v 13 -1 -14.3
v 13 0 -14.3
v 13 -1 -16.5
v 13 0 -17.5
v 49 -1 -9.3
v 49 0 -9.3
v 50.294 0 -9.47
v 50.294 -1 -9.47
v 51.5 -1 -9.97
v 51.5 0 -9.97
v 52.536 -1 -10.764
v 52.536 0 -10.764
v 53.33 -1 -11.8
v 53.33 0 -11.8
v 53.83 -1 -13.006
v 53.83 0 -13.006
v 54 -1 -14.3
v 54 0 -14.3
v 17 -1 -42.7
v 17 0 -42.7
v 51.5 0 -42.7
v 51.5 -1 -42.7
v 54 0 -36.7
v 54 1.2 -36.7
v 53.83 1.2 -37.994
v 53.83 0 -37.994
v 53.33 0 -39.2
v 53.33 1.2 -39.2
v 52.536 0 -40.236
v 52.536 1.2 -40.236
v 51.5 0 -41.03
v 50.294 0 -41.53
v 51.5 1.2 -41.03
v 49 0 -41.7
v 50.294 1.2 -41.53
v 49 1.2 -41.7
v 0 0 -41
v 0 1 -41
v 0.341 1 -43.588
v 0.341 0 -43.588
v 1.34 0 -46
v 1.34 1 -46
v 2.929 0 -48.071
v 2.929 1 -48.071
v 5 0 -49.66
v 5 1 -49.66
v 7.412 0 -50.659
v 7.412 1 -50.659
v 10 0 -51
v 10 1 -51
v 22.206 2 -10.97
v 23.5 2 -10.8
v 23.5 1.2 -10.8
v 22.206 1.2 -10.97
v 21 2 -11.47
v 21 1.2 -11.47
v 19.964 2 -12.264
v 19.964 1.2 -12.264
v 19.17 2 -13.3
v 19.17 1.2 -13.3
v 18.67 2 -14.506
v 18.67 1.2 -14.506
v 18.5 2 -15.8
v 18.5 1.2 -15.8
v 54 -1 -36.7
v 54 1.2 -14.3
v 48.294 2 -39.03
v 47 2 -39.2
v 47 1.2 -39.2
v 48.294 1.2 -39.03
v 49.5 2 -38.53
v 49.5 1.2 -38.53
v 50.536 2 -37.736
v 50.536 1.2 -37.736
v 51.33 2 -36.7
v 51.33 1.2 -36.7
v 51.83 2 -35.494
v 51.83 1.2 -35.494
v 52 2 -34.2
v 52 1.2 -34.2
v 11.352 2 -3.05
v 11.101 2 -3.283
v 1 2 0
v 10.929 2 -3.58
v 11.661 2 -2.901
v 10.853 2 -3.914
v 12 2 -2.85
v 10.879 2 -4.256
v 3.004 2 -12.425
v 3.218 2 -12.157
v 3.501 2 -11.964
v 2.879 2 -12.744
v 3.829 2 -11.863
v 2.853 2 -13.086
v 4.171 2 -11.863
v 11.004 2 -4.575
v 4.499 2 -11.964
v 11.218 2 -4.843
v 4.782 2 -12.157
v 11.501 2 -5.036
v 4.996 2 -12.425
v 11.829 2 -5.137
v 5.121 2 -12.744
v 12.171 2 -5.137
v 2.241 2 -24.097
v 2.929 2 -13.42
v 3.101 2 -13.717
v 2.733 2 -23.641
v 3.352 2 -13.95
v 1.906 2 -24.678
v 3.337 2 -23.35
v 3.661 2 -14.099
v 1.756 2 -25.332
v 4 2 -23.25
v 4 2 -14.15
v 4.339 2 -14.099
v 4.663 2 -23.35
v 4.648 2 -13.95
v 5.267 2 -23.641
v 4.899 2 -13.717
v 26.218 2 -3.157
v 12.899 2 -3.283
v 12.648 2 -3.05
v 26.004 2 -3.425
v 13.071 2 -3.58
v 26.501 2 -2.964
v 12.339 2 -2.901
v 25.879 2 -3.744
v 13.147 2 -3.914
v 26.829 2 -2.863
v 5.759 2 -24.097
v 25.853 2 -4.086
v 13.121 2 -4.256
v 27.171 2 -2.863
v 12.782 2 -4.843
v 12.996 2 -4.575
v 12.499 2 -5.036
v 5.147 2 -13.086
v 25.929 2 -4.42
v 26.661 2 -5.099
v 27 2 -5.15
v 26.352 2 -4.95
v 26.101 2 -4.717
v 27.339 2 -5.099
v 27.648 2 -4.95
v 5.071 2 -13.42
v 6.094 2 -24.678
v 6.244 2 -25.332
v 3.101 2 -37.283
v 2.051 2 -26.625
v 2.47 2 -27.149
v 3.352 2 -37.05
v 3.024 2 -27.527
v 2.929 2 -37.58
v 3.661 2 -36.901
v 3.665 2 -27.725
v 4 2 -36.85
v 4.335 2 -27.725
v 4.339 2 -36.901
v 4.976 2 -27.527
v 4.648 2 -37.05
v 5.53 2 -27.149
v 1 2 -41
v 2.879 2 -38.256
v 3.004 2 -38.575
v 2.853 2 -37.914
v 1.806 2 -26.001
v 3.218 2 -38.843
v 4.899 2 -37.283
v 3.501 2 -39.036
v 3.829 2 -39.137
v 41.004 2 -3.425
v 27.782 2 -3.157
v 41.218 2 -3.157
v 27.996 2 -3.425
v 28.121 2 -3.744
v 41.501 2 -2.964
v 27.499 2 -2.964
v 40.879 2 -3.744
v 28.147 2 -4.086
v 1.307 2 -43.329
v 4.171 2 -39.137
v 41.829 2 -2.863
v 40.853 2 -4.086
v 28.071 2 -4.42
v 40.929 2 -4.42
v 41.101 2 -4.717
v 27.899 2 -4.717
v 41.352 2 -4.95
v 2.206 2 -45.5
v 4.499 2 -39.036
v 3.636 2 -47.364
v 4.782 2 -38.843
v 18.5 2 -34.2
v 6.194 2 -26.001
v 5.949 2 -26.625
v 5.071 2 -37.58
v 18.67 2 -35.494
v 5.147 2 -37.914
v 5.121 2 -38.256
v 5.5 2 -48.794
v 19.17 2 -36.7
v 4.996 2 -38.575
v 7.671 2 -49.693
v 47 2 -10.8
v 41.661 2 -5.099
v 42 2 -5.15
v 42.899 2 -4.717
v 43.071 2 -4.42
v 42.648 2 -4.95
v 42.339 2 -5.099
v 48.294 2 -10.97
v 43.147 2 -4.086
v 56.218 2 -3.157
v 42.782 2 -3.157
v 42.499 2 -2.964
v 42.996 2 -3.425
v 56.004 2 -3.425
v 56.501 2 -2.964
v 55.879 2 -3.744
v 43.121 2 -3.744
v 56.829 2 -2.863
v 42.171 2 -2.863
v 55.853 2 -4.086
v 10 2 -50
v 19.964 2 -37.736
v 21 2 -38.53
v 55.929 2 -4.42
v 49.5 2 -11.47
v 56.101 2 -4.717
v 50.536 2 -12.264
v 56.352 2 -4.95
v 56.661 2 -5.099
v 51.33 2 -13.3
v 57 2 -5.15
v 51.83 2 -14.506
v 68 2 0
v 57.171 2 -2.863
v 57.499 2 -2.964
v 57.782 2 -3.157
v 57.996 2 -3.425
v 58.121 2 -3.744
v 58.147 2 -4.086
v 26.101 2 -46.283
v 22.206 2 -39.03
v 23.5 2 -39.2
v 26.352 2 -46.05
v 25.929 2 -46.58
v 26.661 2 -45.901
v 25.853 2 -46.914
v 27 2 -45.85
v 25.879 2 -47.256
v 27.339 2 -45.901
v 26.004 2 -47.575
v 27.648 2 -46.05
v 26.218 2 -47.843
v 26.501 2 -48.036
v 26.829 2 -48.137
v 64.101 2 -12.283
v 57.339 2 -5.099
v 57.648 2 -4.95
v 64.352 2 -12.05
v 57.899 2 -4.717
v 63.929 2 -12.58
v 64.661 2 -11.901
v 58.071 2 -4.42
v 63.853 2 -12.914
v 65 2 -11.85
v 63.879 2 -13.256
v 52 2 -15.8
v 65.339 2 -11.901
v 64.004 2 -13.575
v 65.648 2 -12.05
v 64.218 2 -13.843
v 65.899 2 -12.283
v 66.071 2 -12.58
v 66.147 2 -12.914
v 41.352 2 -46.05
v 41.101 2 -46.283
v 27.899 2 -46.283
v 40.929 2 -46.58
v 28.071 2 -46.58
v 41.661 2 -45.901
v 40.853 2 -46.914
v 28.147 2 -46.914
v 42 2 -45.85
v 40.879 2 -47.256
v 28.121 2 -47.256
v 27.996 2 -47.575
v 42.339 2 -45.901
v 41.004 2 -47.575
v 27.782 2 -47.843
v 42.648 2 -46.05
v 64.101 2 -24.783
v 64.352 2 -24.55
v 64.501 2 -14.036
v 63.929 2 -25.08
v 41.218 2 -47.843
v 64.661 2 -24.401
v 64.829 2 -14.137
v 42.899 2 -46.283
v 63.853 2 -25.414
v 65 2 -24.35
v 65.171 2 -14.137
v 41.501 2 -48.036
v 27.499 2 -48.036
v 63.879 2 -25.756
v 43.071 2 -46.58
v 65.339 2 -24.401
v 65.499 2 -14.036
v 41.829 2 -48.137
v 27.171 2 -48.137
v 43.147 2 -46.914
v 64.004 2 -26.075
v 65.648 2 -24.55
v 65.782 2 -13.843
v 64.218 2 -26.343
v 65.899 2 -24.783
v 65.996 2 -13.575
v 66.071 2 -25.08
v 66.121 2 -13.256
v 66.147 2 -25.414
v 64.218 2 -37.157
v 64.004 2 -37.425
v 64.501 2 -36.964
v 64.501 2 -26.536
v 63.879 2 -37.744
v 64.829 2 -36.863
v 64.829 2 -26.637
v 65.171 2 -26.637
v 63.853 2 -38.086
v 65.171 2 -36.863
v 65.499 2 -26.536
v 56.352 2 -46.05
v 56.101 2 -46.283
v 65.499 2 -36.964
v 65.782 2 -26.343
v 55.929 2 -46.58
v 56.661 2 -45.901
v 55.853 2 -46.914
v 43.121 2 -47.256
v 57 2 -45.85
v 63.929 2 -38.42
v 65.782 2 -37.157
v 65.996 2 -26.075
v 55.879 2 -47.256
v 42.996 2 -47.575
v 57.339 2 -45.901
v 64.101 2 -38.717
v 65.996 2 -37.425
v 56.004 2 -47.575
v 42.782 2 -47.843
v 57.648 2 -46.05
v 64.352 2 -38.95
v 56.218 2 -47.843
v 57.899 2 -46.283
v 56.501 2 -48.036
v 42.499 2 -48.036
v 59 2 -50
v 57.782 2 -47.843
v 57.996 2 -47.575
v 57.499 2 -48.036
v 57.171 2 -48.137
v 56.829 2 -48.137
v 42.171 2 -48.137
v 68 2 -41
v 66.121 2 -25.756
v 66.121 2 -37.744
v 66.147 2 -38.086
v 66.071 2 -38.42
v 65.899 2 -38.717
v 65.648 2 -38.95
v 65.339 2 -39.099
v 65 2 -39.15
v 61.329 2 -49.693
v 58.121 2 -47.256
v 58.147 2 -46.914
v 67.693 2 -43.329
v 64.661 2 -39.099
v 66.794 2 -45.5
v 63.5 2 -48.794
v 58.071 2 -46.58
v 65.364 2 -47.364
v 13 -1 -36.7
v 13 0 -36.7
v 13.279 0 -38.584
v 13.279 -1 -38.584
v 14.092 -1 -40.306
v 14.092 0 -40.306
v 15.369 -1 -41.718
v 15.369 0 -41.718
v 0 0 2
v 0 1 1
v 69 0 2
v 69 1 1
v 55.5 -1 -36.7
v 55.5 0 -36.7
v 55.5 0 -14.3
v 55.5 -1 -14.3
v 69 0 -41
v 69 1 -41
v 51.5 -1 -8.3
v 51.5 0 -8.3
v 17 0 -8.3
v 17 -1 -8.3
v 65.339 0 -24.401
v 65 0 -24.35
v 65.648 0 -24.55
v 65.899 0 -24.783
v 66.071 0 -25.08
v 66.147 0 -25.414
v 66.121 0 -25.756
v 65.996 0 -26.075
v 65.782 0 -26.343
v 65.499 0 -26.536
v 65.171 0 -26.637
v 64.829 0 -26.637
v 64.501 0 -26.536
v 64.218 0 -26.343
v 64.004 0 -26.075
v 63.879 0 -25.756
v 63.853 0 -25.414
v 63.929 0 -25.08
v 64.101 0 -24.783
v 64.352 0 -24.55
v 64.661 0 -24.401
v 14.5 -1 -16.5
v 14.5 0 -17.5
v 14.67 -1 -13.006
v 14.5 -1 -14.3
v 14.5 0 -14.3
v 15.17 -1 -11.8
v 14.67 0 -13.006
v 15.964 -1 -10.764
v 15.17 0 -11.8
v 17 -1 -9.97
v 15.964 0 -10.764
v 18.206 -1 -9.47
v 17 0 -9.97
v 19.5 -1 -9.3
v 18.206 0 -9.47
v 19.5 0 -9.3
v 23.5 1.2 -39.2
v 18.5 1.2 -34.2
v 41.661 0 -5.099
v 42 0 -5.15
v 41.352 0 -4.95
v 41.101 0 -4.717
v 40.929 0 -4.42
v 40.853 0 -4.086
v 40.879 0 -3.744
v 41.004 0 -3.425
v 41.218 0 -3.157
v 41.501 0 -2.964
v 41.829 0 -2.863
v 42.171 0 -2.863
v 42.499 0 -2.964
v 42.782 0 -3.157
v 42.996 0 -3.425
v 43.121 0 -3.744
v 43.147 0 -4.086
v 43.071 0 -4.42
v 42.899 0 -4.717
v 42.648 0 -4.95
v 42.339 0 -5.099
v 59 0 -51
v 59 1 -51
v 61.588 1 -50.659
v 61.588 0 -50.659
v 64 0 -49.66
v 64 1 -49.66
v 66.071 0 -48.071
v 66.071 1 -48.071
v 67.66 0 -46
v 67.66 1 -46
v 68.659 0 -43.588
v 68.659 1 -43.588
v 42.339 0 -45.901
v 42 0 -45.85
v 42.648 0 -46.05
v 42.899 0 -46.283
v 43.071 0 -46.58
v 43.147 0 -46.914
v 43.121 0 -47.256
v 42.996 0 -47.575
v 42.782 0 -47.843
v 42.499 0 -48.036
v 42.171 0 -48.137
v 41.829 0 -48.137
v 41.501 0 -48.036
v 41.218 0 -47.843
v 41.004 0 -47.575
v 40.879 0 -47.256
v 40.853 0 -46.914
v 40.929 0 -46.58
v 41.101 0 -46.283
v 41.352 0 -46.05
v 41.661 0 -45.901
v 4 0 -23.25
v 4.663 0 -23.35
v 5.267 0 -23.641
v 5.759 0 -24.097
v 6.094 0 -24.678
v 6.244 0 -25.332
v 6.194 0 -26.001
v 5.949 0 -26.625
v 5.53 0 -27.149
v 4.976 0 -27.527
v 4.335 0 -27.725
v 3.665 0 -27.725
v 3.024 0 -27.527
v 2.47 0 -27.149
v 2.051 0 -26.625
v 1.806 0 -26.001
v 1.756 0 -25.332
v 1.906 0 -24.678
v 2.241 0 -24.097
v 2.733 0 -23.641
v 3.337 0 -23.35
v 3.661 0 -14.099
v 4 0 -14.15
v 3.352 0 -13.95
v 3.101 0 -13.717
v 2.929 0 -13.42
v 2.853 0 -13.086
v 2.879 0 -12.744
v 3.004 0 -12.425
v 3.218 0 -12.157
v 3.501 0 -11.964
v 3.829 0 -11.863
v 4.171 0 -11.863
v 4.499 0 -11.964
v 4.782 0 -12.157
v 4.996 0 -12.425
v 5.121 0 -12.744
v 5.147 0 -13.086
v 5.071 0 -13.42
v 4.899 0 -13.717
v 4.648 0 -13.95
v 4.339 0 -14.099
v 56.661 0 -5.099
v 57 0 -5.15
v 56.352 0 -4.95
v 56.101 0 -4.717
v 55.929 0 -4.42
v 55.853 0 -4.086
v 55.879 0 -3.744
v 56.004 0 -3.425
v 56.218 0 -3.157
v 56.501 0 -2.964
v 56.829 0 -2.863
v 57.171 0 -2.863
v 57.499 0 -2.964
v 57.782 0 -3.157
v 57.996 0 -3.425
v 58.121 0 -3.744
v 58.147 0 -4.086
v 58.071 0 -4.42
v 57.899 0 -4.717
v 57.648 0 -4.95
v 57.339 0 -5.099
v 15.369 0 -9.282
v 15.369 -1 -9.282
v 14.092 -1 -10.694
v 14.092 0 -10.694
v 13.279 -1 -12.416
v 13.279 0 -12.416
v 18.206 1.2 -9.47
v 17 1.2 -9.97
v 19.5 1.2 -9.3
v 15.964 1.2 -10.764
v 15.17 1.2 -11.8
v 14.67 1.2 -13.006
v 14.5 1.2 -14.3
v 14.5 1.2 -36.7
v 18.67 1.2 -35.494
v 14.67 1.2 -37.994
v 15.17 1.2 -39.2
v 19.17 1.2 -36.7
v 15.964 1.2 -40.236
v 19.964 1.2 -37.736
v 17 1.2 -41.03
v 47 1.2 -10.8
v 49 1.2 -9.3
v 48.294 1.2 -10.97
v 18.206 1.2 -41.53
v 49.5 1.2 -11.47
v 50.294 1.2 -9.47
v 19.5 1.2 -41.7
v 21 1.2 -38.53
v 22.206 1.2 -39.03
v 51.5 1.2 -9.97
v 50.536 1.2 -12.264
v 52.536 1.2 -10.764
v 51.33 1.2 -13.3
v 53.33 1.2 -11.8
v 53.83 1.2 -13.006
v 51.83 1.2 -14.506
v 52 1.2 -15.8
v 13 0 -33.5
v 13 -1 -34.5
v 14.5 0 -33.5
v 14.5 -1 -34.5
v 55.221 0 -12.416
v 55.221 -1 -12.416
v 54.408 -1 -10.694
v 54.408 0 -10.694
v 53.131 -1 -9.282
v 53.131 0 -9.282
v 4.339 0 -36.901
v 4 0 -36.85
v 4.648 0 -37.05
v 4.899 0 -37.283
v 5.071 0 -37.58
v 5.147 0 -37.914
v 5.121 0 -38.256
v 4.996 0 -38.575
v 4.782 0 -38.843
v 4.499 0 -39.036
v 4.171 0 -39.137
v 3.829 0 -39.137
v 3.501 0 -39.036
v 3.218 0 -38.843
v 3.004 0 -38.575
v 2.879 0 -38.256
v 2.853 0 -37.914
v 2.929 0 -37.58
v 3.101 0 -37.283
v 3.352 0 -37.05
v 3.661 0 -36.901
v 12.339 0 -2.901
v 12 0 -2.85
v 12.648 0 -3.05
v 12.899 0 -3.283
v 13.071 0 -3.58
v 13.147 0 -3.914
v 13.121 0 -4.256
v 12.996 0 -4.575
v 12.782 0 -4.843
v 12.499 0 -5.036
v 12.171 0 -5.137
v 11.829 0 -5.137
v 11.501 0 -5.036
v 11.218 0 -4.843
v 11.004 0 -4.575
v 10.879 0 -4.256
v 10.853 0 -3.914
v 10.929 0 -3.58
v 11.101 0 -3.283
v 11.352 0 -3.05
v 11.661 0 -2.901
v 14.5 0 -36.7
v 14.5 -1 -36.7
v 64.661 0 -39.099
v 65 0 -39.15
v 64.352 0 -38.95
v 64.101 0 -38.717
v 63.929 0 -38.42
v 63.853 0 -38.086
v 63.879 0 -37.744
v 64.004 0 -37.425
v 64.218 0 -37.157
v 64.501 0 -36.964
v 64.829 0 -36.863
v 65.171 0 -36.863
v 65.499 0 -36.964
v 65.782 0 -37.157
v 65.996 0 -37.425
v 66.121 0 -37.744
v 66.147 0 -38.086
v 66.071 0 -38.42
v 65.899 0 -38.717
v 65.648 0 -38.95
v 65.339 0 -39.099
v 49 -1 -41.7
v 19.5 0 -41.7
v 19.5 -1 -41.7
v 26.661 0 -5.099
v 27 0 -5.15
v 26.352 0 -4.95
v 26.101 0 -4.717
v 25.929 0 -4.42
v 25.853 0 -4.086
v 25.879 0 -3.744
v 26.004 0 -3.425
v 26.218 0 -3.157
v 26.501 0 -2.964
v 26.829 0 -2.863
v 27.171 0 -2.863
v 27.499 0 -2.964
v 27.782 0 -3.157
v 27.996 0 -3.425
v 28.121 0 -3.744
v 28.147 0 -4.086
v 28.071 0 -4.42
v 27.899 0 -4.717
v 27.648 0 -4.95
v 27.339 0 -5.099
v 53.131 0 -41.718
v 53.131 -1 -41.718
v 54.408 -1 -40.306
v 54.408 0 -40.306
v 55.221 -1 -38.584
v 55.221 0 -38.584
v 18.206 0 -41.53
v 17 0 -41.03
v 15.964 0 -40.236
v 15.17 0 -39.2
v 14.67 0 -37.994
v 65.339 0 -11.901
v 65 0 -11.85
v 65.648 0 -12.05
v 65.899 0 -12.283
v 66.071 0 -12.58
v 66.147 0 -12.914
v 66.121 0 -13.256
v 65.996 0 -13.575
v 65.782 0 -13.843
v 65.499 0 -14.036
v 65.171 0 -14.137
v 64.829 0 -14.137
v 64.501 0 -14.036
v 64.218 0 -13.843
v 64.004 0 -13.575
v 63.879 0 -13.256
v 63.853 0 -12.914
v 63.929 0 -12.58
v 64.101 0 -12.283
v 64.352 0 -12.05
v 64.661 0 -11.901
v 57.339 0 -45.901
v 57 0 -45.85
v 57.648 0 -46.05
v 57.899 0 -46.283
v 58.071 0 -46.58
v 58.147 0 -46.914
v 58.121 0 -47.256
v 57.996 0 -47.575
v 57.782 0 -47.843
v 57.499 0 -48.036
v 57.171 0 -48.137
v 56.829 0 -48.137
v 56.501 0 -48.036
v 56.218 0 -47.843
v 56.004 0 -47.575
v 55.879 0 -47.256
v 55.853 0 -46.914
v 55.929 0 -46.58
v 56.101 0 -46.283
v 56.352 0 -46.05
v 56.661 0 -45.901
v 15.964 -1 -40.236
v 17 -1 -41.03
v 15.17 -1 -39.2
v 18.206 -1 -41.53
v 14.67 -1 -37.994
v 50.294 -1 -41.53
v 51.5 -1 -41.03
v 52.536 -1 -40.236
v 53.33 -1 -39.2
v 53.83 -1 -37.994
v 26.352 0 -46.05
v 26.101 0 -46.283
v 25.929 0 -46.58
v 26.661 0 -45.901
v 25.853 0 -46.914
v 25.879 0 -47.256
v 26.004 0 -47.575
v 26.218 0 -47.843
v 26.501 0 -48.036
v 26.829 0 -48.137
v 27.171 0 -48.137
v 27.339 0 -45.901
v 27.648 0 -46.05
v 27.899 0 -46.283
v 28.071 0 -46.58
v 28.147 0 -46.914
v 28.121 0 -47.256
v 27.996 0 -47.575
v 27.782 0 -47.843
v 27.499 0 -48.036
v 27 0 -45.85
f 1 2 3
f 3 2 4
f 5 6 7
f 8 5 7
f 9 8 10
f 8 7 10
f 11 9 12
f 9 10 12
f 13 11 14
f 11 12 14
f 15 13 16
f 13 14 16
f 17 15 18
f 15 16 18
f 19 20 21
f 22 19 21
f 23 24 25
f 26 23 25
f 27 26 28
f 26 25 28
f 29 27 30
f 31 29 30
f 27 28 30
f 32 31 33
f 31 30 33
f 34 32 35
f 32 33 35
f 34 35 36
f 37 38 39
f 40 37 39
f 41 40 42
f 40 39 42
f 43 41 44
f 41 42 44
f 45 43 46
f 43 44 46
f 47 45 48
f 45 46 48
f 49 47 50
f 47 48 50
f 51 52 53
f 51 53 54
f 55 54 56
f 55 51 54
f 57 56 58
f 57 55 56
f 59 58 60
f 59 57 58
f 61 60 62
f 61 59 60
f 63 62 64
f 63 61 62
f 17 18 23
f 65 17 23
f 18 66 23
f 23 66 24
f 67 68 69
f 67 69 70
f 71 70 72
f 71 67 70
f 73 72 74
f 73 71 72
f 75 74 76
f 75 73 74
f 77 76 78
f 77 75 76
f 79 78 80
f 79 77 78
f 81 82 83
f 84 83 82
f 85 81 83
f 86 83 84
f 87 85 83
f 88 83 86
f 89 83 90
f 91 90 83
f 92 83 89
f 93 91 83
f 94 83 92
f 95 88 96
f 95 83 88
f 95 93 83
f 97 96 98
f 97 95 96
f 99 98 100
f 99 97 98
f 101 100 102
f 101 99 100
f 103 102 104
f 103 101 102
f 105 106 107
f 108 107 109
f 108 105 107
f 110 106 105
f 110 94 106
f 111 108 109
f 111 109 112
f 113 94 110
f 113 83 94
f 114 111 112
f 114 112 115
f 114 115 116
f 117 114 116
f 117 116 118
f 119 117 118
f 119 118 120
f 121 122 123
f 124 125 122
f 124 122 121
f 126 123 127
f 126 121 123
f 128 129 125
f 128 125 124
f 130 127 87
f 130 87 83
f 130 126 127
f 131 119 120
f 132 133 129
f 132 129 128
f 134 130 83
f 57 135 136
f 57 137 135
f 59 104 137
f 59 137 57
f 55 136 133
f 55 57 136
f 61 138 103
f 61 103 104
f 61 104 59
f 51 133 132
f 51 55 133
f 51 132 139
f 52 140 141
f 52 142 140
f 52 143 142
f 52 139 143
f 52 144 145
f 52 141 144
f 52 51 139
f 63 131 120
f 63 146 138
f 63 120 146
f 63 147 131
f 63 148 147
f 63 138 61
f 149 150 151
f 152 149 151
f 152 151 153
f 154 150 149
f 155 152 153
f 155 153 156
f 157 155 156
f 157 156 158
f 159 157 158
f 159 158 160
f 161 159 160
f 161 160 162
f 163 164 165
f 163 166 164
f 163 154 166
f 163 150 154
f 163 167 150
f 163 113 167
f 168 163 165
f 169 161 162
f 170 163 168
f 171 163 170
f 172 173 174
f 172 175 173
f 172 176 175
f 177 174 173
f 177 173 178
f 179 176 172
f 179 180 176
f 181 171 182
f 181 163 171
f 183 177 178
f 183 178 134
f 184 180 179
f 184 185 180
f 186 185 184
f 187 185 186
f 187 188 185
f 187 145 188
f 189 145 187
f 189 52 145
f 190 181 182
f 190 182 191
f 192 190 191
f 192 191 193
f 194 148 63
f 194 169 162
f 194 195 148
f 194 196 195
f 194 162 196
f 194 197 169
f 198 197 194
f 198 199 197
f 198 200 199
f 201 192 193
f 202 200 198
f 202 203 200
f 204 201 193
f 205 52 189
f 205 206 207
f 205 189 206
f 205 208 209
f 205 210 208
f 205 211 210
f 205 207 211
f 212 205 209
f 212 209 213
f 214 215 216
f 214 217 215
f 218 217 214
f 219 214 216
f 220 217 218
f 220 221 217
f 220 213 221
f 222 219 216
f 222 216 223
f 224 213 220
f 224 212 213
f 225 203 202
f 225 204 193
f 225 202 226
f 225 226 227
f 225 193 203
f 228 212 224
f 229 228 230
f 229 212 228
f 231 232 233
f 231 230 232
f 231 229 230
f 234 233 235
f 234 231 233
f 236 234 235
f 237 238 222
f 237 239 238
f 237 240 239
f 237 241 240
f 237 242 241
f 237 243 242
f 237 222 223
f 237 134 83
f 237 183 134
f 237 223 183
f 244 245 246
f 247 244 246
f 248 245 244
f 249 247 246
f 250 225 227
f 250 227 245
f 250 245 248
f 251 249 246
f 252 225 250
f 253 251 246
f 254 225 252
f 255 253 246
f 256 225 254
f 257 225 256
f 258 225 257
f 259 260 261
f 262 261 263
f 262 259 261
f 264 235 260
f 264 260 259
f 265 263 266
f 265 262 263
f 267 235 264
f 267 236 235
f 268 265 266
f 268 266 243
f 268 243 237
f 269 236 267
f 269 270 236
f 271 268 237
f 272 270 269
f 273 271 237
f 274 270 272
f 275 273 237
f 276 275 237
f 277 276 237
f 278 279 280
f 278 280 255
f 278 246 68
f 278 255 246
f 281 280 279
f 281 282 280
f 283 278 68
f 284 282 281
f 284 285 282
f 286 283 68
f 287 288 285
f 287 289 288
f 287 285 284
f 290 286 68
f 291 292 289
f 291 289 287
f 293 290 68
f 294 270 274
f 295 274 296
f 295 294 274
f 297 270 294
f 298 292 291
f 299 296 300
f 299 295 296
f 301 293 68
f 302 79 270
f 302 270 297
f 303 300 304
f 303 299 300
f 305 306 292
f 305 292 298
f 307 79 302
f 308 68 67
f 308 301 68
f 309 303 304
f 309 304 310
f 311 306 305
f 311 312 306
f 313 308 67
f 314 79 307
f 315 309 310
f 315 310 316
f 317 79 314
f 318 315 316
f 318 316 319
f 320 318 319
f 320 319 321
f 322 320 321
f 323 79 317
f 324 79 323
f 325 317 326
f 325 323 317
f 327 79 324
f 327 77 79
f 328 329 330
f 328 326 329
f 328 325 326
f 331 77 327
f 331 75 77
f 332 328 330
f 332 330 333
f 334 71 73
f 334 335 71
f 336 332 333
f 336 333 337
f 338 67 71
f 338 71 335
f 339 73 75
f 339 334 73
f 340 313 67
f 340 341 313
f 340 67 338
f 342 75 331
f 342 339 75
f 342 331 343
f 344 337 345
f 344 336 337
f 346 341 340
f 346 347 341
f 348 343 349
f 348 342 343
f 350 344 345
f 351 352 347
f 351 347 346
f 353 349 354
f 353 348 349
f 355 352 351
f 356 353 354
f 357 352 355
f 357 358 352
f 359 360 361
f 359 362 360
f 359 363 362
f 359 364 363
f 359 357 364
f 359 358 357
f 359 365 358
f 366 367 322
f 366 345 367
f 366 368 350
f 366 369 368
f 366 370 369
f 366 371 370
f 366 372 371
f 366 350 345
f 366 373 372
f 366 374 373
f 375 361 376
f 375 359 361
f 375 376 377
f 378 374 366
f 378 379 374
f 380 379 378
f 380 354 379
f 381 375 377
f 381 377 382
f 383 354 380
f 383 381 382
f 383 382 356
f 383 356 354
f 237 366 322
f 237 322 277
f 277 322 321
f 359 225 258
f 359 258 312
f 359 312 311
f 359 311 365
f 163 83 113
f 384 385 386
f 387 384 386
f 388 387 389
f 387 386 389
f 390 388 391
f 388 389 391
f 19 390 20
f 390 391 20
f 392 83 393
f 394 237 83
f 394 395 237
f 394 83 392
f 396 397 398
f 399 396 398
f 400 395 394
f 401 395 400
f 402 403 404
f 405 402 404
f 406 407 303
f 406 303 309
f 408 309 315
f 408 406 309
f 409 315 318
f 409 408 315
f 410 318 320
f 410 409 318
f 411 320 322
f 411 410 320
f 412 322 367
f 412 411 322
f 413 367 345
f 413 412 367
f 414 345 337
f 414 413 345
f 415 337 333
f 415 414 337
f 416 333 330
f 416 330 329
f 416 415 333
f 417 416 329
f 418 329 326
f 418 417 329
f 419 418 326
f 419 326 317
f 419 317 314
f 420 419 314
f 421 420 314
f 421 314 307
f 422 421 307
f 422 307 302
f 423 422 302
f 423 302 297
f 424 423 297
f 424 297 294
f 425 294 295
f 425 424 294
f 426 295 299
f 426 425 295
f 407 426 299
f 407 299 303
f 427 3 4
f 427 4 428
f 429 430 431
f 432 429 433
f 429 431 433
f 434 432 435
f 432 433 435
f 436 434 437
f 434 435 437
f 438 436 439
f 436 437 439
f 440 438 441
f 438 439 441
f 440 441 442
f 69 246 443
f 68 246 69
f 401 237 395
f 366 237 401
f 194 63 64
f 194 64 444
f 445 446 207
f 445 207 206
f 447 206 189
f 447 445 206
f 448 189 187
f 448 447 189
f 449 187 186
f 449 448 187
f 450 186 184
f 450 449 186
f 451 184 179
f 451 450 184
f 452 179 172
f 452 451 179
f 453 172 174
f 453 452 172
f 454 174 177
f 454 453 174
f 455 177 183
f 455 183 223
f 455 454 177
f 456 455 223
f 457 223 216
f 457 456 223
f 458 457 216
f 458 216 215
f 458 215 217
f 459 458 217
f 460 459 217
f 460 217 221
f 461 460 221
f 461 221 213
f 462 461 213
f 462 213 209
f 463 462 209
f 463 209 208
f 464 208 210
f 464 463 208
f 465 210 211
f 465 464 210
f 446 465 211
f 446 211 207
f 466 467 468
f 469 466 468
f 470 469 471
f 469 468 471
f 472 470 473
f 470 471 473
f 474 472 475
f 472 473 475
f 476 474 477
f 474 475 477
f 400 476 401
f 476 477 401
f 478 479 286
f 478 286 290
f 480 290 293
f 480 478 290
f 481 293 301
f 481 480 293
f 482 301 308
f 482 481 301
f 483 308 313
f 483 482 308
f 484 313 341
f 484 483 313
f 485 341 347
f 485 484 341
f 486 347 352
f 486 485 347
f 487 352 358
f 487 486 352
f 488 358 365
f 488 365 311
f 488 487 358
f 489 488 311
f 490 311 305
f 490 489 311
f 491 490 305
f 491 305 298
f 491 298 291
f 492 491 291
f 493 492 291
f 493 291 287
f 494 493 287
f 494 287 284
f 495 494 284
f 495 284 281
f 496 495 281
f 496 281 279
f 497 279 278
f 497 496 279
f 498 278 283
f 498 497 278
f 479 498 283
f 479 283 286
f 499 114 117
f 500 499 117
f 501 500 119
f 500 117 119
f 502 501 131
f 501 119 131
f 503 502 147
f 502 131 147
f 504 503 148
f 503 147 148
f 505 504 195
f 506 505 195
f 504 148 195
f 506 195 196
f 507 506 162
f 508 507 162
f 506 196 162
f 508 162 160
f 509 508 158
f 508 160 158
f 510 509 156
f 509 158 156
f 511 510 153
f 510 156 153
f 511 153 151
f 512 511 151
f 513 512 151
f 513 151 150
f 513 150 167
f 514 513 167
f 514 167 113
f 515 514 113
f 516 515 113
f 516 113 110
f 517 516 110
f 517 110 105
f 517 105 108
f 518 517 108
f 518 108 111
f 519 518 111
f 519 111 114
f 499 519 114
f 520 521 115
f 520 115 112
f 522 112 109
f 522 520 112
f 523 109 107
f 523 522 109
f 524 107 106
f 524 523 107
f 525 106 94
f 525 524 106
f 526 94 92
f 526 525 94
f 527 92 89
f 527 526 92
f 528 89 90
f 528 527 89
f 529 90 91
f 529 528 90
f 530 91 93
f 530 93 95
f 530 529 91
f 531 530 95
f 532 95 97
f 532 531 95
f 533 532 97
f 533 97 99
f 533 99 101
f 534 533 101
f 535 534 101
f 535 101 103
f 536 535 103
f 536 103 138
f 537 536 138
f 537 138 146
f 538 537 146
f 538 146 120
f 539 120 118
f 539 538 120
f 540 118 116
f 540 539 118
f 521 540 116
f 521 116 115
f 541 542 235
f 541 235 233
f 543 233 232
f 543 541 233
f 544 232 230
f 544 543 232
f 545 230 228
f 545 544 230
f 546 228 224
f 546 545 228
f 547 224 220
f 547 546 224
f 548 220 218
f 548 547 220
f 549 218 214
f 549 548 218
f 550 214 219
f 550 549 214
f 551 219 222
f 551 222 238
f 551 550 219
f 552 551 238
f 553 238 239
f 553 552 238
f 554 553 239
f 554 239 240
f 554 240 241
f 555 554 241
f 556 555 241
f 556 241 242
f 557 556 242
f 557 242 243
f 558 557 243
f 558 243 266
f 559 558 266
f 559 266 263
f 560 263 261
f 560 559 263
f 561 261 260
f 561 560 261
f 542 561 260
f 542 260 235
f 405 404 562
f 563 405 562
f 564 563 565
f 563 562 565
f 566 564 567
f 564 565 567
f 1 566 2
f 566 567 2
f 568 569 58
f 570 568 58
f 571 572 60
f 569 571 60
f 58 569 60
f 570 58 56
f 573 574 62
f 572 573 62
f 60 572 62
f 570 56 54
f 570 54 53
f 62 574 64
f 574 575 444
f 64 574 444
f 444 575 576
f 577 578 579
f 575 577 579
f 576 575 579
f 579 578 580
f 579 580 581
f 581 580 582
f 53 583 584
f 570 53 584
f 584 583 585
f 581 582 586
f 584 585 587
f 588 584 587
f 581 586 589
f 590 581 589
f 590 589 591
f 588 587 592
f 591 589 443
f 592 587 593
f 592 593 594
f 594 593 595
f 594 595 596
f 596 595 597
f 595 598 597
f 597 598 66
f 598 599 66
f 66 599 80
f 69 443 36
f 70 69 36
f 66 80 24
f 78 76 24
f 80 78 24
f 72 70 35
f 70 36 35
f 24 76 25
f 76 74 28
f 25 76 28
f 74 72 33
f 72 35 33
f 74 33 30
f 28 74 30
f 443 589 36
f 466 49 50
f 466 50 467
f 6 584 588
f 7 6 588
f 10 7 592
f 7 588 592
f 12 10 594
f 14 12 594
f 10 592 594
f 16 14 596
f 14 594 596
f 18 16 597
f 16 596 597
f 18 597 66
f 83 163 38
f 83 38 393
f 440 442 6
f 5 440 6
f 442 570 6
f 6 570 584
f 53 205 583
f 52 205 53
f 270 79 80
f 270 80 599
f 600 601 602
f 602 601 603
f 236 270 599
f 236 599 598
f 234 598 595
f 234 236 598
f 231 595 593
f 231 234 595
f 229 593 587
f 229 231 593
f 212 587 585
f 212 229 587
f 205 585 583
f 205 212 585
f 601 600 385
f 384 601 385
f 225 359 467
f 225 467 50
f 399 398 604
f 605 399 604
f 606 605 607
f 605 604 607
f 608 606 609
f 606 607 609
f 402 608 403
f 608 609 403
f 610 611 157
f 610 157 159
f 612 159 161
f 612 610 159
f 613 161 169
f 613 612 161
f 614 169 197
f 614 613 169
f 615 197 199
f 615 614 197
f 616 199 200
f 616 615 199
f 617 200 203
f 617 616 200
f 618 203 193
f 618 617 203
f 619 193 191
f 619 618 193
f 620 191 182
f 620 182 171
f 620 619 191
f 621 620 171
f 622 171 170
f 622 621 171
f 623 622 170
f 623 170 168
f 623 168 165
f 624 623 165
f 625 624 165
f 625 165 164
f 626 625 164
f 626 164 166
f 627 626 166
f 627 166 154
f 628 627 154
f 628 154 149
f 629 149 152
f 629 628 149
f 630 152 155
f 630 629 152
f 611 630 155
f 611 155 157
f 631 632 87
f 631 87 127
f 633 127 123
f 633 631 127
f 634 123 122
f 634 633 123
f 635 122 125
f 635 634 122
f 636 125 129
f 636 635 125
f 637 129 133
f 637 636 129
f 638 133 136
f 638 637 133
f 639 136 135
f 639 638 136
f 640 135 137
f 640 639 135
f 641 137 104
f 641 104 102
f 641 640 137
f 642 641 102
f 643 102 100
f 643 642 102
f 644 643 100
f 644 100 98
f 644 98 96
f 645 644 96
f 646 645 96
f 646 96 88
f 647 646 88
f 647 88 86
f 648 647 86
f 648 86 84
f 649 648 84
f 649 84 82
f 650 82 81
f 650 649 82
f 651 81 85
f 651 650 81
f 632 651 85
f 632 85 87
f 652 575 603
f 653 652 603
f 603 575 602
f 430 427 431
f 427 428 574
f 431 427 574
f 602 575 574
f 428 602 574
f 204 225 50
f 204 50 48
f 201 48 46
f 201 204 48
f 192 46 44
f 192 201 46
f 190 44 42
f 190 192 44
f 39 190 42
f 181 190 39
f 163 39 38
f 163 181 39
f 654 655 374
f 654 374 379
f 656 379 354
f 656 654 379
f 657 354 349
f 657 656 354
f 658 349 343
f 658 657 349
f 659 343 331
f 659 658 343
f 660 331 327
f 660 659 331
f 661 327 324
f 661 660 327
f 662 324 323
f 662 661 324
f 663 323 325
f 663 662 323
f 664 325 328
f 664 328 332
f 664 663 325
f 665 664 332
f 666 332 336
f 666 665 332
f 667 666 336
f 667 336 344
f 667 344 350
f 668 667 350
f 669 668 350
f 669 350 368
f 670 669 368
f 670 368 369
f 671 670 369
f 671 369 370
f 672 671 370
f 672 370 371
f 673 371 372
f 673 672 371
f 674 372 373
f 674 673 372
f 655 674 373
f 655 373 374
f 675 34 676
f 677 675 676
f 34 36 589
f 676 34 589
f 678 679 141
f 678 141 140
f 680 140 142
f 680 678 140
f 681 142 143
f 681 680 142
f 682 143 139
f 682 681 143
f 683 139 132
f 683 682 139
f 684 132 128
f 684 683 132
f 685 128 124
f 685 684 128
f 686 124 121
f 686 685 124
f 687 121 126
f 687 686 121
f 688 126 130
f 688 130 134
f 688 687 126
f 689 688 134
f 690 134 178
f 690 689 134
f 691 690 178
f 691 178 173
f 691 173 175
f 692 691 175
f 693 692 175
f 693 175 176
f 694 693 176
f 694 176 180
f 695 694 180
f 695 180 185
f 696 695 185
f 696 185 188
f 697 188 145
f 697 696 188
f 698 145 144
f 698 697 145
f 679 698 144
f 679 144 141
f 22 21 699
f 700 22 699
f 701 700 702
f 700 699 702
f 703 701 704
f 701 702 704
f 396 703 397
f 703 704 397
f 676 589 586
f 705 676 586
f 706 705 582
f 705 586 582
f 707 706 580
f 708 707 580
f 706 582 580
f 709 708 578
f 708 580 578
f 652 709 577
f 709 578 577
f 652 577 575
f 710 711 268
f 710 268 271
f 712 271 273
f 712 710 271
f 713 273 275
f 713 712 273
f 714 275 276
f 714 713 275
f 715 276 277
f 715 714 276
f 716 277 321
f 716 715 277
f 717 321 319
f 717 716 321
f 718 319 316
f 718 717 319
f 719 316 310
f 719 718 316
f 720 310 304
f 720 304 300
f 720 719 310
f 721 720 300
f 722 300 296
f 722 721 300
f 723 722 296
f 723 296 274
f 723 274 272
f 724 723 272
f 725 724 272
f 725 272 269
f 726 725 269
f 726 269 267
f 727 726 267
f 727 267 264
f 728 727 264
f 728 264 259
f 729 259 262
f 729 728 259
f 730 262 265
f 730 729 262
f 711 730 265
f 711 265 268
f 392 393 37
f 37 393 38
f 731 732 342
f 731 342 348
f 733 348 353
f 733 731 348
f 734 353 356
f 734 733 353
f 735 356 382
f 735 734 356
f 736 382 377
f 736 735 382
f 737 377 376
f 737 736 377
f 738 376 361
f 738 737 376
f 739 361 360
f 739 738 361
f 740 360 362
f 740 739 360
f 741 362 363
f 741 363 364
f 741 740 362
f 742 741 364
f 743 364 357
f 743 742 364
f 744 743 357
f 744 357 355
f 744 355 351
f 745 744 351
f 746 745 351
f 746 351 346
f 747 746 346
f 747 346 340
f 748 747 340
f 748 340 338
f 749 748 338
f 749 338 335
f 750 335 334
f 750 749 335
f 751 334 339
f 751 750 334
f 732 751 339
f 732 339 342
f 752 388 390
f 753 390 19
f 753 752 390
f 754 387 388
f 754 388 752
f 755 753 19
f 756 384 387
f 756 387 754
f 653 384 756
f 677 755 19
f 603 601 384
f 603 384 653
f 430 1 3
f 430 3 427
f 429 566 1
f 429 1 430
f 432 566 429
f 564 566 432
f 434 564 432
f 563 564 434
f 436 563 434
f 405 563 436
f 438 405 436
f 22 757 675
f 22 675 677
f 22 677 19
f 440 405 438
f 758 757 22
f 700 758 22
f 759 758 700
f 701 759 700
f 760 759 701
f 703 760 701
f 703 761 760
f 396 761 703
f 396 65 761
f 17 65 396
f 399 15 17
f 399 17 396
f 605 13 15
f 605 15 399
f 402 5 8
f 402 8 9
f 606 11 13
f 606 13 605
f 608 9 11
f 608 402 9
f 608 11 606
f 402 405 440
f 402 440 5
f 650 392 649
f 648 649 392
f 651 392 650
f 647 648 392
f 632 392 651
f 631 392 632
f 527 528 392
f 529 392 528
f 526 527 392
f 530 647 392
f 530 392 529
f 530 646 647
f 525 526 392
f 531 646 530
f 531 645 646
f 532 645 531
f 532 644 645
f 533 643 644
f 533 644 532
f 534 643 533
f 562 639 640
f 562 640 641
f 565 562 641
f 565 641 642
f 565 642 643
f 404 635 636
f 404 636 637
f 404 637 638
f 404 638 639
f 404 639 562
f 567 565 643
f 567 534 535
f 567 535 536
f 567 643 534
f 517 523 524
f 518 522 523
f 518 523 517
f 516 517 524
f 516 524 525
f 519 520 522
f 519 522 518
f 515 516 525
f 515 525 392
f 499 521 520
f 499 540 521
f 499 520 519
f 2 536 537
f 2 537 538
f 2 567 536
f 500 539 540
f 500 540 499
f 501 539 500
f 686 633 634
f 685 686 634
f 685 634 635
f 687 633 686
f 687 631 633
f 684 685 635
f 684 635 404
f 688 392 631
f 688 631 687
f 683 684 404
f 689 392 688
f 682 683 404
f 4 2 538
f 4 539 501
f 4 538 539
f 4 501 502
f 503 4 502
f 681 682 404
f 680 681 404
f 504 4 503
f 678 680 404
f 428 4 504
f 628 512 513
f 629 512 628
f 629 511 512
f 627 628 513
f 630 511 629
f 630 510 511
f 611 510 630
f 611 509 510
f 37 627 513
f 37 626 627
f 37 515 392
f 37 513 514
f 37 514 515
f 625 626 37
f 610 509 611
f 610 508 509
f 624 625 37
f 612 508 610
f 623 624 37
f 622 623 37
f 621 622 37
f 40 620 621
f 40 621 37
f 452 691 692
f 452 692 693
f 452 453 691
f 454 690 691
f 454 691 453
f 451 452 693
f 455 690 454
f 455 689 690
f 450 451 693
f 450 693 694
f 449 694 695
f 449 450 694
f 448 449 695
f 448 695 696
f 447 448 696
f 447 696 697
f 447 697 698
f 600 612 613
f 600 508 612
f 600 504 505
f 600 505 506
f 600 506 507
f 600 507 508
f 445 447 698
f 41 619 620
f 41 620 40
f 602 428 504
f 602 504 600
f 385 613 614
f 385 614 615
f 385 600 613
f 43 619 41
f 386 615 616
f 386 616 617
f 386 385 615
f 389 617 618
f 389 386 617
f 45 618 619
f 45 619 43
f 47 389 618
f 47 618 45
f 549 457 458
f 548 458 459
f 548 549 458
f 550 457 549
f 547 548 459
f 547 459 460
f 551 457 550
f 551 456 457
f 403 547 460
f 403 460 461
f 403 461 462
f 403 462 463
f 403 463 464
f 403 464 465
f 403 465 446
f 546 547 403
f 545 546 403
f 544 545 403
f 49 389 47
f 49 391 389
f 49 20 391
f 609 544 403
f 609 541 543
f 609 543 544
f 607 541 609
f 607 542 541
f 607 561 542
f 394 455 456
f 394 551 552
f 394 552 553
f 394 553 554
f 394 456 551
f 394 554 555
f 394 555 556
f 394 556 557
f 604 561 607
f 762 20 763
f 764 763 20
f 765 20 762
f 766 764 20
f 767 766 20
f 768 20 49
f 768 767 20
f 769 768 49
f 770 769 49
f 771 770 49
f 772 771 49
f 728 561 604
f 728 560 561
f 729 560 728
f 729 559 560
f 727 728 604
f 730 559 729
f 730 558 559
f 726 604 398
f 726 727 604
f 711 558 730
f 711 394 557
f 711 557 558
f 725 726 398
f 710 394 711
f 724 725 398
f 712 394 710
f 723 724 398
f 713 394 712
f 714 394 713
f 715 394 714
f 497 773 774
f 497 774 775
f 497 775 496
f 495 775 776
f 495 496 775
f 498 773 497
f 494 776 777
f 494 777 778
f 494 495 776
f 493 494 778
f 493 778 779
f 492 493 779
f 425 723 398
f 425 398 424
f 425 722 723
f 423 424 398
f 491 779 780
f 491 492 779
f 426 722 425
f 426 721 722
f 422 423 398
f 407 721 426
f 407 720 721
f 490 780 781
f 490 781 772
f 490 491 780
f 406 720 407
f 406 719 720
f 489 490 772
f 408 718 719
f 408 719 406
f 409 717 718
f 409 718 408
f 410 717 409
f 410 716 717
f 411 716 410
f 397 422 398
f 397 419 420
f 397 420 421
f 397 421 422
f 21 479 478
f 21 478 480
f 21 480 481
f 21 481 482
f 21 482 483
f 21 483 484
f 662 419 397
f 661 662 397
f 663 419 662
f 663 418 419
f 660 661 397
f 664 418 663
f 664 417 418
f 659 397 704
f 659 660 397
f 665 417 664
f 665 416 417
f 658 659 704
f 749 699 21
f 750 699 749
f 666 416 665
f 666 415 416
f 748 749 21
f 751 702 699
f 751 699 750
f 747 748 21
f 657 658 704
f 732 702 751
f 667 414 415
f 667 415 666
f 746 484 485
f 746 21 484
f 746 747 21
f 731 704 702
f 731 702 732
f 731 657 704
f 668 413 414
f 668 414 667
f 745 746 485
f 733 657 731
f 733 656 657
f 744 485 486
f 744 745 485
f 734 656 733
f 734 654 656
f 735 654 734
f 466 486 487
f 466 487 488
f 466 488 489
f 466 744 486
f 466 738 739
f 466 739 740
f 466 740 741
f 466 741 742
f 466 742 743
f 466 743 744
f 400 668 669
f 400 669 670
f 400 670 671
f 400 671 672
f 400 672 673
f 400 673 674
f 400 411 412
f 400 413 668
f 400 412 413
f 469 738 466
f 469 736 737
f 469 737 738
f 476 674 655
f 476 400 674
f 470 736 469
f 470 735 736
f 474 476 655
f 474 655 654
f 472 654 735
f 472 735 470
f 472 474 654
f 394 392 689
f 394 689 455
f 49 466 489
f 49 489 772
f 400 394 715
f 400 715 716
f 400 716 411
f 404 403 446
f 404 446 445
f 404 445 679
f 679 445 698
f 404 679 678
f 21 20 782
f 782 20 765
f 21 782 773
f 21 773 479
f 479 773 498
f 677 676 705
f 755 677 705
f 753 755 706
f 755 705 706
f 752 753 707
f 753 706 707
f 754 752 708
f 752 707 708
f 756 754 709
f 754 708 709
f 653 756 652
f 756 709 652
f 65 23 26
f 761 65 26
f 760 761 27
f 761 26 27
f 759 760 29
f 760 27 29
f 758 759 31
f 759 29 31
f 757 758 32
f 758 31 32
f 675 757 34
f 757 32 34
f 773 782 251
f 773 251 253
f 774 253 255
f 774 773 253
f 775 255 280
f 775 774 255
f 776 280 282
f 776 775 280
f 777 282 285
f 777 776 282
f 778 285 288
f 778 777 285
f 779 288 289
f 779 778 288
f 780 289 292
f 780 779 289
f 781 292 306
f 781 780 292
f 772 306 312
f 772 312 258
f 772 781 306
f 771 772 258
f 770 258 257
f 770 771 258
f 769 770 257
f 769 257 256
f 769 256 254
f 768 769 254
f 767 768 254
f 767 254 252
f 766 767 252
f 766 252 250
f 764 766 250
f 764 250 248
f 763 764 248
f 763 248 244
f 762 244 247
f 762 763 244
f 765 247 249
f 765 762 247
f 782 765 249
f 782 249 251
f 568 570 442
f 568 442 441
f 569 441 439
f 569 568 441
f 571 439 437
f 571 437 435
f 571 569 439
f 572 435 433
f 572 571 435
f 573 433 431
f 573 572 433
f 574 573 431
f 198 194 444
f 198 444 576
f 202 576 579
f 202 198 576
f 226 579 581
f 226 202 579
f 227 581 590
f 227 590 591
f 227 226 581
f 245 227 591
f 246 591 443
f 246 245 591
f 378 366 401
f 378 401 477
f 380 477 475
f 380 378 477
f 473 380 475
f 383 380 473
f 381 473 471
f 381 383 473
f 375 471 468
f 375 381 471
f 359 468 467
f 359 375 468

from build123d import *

# Parameters (mm, degrees)
SKETCH_1_W          = 69
SKETCH_1_H          = 51
SKETCH_1_R          = 1.15
SKETCH_1_W_2        = 39.5
SKETCH_1_H_2        = 32.4
EXTRUDE_1_DEPTH     = 2
FILLET_1_R          = 10
FILLET_2_R          = 5
EXTRUDE_2_DEPTH     = 0.8
EXTRUDE_4_DEPTH     = 69
CHAMFER_1_SIZE      = 1
EXTRUDE_3_DEPTH     = 1
SKETCH_5_W          = 1.5
SKETCH_5_H          = 18
CUT_EXTRUDE_1_DEPTH = 1
CHAMFER_2_SIZE      = 1
CUT_EXTRUDE_2_REACH = 87.855
SKETCH_7_R          = 2.25


with BuildPart() as part:
    # 草图1 → 凸台-拉伸1 (new body)
    with BuildSketch(Plane(origin=(0, 0, 0), x_dir=(1, 0, 0), z_dir=(0, 1, 0))):
        with Locations((34.5, 25.5)):
            Rectangle(SKETCH_1_W, SKETCH_1_H)
        with Locations(Location((4, 25.5, 0), (0, 0, 270))):
            Circle(SKETCH_1_R, mode=Mode.SUBTRACT)
        with Locations(Location((65, 25.5, 0), (0, 0, 270))):
            Circle(SKETCH_1_R, mode=Mode.SUBTRACT)
        with Locations(Location((27, 47, 0), (0, 0, 270))):
            Circle(SKETCH_1_R, mode=Mode.SUBTRACT)
        with Locations(Location((42, 47, 0), (0, 0, 270))):
            Circle(SKETCH_1_R, mode=Mode.SUBTRACT)
        with Locations(Location((42, 4, 0), (0, 0, 90))):
            Circle(SKETCH_1_R, mode=Mode.SUBTRACT)
        with Locations(Location((27, 4, 0), (0, 0, 90))):
            Circle(SKETCH_1_R, mode=Mode.SUBTRACT)
        with Locations(Location((4, 38, 0), (0, 0, 270))):
            Circle(SKETCH_1_R, mode=Mode.SUBTRACT)
        with Locations(Location((4, 13, 0), (0, 0, 90))):
            Circle(SKETCH_1_R, mode=Mode.SUBTRACT)
        with Locations(Location((65, 13, 0), (0, 0, 270))):
            Circle(SKETCH_1_R, mode=Mode.SUBTRACT)
        with Locations(Location((65, 38, 0), (0, 0, 90))):
            Circle(SKETCH_1_R, mode=Mode.SUBTRACT)
        with Locations(Location((57, 47, 0), (0, 0, 270))):
            Circle(SKETCH_1_R, mode=Mode.SUBTRACT)
        with Locations(Location((57, 4, 0), (0, 0, 90))):
            Circle(SKETCH_1_R, mode=Mode.SUBTRACT)
        with Locations(Location((12, 4, 0), (0, 0, 270))):
            Circle(SKETCH_1_R, mode=Mode.SUBTRACT)
        with Locations((34.25, 25.5)):
            Rectangle(SKETCH_1_W_2, SKETCH_1_H_2, mode=Mode.SUBTRACT)
    extrude(amount=EXTRUDE_1_DEPTH)

    # 圆角1
    fillet_1_edges = [part.edges().sort_by_distance(p)[0] for p in [
        (0, 1, -51),
        (69, 1, -51),
    ]]
    fillet(fillet_1_edges, radius=FILLET_1_R)

    # 圆角2
    fillet_2_edges = [part.edges().sort_by_distance(p)[0] for p in [
        (14.5, 1, -41.7),
        (14.5, 1, -9.3),
        (54, 1, -9.3),
        (54, 1, -41.7),
    ]]
    fillet(fillet_2_edges, radius=FILLET_2_R)

    # 草图2 → 凸台-拉伸2 (add)
    with BuildSketch(Plane(origin=(0, 2, 0), x_dir=(1, 0, 0), z_dir=(0, 1, 0))):
        with BuildLine():
            Line((54, 14.3), (54, 36.7))
            ThreePointArc((54, 36.7), (52.535533906, 40.235533906), (49, 41.7))
            Line((49, 41.7), (19.5, 41.7))
            ThreePointArc((19.5, 41.7), (15.964466094, 40.235533906), (14.5, 36.7))
            Line((14.5, 36.7), (14.5, 14.3))
            ThreePointArc((14.5, 14.3), (15.964466094, 10.764466094), (19.5, 9.3))
            Line((19.5, 9.3), (49, 9.3))
            ThreePointArc((49, 9.3), (52.535533906, 10.764466094), (54, 14.3))
        make_face()
        with BuildLine():
            Line((23.5, 39.2), (47, 39.2))
            ThreePointArc((47, 39.2), (50.535533906, 37.735533906), (52, 34.2))
            Line((52, 34.2), (52, 15.8))
            ThreePointArc((52, 15.8), (50.535533906, 12.264466094), (47, 10.8))
            Line((47, 10.8), (23.5, 10.8))
            ThreePointArc((23.5, 10.8), (19.964466094, 12.264466094), (18.5, 15.8))
            Line((18.5, 15.8), (18.5, 34.2))
            ThreePointArc((18.5, 34.2), (19.964466094, 37.735533906), (23.5, 39.2))
        make_face(mode=Mode.SUBTRACT)
    extrude(amount=-EXTRUDE_2_DEPTH)

    # 草图4 → 凸台-拉伸4 (add)
    with BuildSketch(Plane(origin=(69, 0, 0), x_dir=(0, 0, -1), z_dir=(1, 0, 0))):
        Polygon((0, 2), (-2, 0), (0, 0), align=None)
    extrude(amount=-EXTRUDE_4_DEPTH)

    # 倒角1
    chamfer_1_edges = [part.edges().sort_by_distance(p)[0] for p in [
        (69, 2, -20.5),
        (34.5, 2, -51),
        (0, 2, -20.5),
        (2.928932188, 2, -48.071067812),
        (66.071067812, 2, -48.071067812),
    ]]
    chamfer(chamfer_1_edges, length=CHAMFER_1_SIZE)

    # 草图3 → 凸台-拉伸3 (add)
    with BuildSketch(Plane.XZ):
        with BuildLine():
            ThreePointArc((17, -8.3), (14.091673087, -10.694448725), (13, -14.3))
            Line((13, -14.3), (13, -36.7))
            ThreePointArc((13, -36.7), (14.091673087, -40.305551275), (17, -42.7))
            Line((17, -42.7), (51.5, -42.7))
            ThreePointArc((51.5, -42.7), (54.408326913, -40.305551275), (55.5, -36.7))
            Line((55.5, -36.7), (55.5, -14.3))
            ThreePointArc((55.5, -14.3), (54.408326913, -10.694448725), (51.5, -8.3))
            Line((51.5, -8.3), (17, -8.3))
        make_face()
        with BuildLine():
            Line((54, -14.3), (54, -36.7))
            ThreePointArc((54, -36.7), (52.535533906, -40.235533906), (49, -41.7))
            Line((49, -41.7), (19.5, -41.7))
            ThreePointArc((19.5, -41.7), (15.964466094, -40.235533906), (14.5, -36.7))
            Line((14.5, -36.7), (14.5, -14.3))
            ThreePointArc((14.5, -14.3), (15.964466094, -10.764466094), (19.5, -9.3))
            Line((19.5, -9.3), (49, -9.3))
            ThreePointArc((49, -9.3), (52.535533906, -10.764466094), (54, -14.3))
        make_face(mode=Mode.SUBTRACT)
    extrude(amount=EXTRUDE_3_DEPTH)

    # 草图5 → 切除-拉伸1 (cut)
    with BuildSketch(Plane.XZ):
        with Locations((13.75, -25.5)):
            Rectangle(SKETCH_5_W, SKETCH_5_H)
    extrude(amount=CUT_EXTRUDE_1_DEPTH, mode=Mode.SUBTRACT)

    # 倒角2
    chamfer_2_edges = [part.edges().sort_by_distance(p)[0] for p in [
        (13.75, 0, -34.5),
        (13.75, 0, -16.5),
    ]]
    chamfer(chamfer_2_edges, length=CHAMFER_2_SIZE - 0.0001)  # a hair under: the kernel refuses the full size

    # 草图7 → 切除-拉伸2 (cut, up to next)
    with BuildSketch(Plane(origin=(0, 2, 0), x_dir=(1, 0, 0), z_dir=(0, 1, 0)), mode=Mode.PRIVATE) as cut_extrude_2_sk1:
        with Locations(Location((4, 25.5, 0), (0, 0, 270))):
            Circle(SKETCH_7_R)
    cut_extrude_2_tool1 = extrude(cut_extrude_2_sk1.sketch, amount=-CUT_EXTRUDE_2_REACH, mode=Mode.PRIVATE) & part.part
    add(cut_extrude_2_tool1.solids().sort_by_distance((4, 2, -25.5))[0], mode=Mode.SUBTRACT)


solid = part.part
